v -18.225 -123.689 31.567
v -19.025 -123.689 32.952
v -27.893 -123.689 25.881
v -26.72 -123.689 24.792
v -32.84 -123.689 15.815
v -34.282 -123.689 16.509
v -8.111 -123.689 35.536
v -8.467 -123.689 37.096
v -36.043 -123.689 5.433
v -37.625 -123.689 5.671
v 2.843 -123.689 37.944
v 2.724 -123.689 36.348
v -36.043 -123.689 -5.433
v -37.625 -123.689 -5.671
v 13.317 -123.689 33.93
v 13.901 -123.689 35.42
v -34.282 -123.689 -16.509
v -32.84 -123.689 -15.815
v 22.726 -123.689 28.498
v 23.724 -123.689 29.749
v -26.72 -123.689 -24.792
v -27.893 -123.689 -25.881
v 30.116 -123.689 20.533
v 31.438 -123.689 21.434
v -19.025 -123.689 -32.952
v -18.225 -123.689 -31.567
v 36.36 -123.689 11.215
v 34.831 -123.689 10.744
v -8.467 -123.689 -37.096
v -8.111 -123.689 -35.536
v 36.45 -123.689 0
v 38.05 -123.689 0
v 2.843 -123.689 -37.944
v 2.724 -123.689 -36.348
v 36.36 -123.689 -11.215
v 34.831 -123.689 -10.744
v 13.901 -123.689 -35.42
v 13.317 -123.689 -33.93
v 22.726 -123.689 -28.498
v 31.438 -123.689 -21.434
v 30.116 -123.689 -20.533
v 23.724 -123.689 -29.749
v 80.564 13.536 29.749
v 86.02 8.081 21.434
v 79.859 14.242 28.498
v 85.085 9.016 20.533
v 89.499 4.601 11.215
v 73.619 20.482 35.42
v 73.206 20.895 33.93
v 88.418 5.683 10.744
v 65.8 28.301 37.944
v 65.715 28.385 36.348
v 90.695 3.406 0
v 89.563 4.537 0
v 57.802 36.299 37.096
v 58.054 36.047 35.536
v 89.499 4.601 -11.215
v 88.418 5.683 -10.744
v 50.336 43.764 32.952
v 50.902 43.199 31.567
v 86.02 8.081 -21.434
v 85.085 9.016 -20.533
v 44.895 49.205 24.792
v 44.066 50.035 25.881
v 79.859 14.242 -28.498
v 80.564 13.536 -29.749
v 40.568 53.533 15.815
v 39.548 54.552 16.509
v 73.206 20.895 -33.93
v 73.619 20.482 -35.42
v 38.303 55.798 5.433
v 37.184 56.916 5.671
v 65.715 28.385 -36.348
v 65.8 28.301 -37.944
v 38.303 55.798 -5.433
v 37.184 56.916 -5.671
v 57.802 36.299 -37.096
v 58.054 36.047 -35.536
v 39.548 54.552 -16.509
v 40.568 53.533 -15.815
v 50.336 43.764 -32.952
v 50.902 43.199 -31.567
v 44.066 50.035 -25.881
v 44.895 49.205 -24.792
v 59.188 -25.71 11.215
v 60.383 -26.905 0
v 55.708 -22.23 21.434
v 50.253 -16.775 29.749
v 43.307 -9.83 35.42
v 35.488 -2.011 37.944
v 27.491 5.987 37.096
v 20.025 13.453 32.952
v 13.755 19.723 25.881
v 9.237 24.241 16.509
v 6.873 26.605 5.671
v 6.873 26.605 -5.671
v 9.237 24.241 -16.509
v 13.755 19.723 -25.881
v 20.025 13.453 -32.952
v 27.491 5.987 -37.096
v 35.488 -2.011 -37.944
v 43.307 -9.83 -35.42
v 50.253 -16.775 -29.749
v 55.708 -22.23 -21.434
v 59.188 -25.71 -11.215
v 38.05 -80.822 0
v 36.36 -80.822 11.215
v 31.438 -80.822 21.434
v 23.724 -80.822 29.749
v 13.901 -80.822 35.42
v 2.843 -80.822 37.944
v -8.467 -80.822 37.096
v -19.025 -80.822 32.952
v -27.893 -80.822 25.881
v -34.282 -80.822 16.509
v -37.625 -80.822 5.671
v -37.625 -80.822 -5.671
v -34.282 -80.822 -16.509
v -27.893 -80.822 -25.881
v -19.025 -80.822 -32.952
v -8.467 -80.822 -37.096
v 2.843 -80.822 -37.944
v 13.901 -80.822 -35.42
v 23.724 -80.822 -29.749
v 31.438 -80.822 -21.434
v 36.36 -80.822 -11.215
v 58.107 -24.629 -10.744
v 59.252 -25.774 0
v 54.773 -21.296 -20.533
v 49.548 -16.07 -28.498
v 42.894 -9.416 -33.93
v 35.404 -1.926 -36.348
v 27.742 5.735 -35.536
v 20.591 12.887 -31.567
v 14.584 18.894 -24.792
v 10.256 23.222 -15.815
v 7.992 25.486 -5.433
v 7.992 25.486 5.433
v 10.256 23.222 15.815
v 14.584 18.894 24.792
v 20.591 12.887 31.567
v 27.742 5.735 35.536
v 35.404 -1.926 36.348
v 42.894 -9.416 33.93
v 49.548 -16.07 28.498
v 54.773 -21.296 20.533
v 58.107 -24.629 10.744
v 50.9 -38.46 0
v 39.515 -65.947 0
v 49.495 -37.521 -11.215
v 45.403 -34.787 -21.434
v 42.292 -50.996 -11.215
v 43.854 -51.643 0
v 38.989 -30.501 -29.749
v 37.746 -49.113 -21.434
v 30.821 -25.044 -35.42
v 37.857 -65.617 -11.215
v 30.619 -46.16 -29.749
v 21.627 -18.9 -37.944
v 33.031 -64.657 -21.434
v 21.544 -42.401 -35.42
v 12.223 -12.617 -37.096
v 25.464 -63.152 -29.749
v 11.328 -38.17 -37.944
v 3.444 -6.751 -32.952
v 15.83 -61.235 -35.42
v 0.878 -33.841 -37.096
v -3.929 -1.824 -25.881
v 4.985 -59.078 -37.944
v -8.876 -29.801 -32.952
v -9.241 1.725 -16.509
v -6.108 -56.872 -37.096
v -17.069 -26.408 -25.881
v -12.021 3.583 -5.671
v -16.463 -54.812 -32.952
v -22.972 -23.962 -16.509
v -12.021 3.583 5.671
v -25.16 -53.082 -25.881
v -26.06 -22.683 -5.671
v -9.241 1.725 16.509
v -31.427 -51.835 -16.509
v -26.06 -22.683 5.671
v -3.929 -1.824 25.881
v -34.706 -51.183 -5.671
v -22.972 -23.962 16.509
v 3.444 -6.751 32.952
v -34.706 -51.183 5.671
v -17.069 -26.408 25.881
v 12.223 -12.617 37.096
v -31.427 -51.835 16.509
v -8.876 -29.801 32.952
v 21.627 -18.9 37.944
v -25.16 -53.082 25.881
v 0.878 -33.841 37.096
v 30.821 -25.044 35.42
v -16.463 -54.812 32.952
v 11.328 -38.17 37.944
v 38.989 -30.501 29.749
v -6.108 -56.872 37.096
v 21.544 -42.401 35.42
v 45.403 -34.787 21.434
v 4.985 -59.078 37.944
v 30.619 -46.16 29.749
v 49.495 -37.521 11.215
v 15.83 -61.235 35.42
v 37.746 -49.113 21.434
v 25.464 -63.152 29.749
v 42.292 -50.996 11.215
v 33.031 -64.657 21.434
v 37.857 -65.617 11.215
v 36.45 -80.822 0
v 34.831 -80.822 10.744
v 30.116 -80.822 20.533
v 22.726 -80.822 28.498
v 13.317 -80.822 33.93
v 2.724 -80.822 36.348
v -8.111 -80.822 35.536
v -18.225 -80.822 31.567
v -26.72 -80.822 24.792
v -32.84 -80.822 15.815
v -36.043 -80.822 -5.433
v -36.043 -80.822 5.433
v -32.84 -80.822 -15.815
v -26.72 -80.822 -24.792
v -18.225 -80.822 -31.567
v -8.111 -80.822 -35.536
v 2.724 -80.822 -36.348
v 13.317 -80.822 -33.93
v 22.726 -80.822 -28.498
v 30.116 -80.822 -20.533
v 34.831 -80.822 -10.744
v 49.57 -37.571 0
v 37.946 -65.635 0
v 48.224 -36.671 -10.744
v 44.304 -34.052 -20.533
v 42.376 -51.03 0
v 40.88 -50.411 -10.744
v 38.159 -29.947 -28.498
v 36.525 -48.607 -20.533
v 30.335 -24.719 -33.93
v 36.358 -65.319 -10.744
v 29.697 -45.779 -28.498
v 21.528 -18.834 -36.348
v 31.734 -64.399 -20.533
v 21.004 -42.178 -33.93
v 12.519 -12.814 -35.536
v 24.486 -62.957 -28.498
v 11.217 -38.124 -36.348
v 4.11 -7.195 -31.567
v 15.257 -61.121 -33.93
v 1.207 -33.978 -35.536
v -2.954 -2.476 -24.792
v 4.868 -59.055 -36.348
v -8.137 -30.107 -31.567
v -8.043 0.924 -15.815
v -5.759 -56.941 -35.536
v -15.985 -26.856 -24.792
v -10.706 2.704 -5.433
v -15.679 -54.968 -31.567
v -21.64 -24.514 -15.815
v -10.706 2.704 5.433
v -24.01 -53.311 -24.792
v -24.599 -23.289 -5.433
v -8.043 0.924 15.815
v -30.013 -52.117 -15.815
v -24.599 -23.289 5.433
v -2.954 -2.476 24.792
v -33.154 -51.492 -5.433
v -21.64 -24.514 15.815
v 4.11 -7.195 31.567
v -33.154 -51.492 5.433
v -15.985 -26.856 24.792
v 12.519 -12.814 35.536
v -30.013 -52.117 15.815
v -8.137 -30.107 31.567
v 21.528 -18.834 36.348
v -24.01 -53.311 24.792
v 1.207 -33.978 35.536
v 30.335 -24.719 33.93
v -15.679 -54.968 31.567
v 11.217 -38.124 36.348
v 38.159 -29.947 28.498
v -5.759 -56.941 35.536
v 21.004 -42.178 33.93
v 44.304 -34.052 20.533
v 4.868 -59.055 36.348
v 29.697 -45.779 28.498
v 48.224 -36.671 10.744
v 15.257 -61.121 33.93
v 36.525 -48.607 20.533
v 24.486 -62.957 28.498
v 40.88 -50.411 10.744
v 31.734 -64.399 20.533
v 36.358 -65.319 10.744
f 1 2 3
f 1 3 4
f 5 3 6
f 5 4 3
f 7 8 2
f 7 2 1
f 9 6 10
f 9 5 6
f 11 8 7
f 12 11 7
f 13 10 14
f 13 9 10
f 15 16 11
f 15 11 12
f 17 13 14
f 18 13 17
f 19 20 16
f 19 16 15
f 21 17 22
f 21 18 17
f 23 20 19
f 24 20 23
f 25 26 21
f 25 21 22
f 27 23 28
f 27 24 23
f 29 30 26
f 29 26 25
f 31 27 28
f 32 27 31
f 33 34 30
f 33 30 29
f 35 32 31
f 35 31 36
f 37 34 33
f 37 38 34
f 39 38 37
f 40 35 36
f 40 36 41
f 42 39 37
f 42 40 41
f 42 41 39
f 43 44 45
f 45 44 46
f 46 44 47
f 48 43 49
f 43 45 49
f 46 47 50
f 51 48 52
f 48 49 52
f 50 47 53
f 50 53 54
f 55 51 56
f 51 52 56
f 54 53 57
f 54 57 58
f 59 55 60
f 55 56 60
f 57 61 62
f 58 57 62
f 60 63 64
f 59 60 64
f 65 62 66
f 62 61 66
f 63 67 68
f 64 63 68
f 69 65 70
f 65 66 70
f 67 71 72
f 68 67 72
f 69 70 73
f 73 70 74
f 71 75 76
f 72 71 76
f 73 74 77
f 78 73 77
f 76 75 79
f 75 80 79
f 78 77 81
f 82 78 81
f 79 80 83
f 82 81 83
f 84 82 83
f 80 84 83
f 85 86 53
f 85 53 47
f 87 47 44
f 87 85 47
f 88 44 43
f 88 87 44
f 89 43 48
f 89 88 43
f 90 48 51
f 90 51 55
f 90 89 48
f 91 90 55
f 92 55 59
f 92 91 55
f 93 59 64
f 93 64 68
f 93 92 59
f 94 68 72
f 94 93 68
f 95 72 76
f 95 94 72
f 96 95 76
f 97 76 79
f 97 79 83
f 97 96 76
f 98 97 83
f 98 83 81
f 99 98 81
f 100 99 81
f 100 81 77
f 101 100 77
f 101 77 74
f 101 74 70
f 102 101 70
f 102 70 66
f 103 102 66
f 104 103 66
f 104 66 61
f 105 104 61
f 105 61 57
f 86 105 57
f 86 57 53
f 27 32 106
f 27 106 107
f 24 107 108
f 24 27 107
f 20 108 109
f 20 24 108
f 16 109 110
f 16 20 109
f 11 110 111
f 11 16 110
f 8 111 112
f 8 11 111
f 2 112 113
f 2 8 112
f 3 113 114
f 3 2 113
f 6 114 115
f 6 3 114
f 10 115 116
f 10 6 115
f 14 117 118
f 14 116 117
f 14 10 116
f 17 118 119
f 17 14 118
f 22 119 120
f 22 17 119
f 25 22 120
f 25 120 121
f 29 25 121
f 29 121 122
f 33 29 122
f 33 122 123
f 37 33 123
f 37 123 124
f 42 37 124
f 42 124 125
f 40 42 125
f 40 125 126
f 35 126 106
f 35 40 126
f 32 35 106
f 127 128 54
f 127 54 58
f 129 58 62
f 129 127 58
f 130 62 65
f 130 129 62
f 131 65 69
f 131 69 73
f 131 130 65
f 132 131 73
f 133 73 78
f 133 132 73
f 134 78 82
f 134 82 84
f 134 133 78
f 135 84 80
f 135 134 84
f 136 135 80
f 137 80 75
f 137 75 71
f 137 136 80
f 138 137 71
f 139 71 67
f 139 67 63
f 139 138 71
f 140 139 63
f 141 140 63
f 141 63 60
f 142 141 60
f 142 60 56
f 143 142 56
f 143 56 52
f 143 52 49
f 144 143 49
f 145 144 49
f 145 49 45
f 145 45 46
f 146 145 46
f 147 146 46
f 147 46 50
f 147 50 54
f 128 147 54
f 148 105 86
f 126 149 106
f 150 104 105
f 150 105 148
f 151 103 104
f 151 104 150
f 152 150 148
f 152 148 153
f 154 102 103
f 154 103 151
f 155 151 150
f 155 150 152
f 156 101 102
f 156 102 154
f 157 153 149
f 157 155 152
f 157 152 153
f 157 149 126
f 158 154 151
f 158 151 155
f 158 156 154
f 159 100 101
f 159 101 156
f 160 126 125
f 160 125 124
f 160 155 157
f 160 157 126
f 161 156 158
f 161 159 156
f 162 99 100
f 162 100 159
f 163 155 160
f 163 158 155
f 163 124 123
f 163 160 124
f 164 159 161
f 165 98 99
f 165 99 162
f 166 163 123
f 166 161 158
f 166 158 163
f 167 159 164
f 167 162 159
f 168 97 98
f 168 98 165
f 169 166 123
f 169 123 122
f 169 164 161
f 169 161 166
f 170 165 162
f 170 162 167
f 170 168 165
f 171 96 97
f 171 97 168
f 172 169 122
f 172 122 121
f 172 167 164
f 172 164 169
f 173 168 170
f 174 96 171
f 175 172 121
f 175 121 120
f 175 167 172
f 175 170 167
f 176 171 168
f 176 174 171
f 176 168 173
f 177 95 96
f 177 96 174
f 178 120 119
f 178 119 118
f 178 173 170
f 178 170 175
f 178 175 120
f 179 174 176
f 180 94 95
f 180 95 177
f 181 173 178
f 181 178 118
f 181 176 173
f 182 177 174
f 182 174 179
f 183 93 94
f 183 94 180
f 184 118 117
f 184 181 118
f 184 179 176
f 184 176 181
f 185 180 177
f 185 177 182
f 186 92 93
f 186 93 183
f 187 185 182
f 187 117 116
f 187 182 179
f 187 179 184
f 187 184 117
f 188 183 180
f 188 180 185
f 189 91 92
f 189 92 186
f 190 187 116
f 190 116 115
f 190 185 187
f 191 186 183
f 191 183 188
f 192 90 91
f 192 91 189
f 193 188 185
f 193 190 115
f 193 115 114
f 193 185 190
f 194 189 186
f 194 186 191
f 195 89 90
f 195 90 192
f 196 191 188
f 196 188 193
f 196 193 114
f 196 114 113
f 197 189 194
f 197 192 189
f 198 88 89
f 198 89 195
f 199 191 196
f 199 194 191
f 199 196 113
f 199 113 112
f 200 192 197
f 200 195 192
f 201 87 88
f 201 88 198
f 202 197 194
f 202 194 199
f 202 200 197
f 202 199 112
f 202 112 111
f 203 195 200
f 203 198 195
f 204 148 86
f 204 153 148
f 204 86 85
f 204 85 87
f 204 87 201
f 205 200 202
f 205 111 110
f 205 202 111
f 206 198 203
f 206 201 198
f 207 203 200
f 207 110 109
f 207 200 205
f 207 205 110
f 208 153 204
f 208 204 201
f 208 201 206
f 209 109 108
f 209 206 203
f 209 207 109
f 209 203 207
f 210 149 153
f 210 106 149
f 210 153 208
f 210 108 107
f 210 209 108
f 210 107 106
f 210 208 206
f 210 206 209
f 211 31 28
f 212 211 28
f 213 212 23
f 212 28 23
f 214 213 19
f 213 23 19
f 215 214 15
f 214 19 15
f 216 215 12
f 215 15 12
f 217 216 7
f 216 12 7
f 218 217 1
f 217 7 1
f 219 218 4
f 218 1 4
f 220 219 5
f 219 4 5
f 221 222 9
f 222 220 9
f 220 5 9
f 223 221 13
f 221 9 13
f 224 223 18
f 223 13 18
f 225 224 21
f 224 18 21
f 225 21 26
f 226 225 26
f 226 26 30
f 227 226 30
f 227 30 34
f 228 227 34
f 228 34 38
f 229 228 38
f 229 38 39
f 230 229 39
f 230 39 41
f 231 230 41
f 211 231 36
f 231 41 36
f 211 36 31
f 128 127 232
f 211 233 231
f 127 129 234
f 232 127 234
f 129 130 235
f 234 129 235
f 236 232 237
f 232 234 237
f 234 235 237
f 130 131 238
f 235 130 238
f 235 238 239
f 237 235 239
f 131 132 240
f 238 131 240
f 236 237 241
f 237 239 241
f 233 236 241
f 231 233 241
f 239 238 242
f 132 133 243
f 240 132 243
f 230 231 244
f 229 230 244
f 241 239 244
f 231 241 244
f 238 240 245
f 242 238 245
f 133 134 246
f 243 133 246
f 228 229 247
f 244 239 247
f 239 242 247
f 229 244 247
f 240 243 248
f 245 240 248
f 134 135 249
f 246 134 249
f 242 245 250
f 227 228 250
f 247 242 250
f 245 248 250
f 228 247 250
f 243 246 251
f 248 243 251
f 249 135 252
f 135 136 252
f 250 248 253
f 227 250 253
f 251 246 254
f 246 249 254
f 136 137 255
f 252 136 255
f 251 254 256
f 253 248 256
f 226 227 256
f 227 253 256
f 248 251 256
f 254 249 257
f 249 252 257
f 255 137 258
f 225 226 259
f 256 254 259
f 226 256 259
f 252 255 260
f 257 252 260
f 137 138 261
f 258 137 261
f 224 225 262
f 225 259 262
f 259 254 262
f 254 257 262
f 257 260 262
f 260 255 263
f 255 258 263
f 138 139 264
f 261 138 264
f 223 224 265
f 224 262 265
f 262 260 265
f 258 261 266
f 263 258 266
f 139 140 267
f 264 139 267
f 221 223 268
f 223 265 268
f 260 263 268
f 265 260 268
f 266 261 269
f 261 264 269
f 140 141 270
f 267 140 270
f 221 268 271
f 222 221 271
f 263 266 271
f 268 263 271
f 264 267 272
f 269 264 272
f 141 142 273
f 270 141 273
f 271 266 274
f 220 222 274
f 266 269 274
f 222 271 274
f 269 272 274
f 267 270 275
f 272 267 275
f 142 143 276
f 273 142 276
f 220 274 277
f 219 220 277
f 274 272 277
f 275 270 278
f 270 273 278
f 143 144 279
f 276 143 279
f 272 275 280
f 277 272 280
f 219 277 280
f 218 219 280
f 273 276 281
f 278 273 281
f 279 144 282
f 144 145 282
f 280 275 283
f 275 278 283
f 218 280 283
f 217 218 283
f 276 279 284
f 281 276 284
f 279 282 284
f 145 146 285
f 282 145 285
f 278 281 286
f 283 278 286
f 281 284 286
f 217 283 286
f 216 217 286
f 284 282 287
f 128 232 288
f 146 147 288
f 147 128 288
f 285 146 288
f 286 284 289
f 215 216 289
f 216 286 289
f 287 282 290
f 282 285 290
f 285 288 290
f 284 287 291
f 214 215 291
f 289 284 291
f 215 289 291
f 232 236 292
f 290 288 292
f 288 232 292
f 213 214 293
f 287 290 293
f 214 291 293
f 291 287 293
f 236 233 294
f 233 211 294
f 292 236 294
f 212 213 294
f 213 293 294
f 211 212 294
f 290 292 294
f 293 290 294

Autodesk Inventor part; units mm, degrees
ref_plane "YZ Plane" through (0, 0, 0) normal (1, 0, 0) x (0, 1, 0)
ref_plane "XZ Plane" through (0, 0, 0) normal (0, 1, 0) x (-1, 0, 0)
sketch "Szkic6" plane through (0, 0, 0) normal (0, 0, 1) x (1, 0, 0)
  line L0 (-29.6067, 0) -> (35.2678, 0) construction
  line L1 (0, 42.3419) -> (0, -58.3726) construction
  arc A0 (33.4777, 0) -> (0, -80.8223) centre (114.3, -80.8223) ccw
  line L2 (0, -80.8223) -> (114.3, -80.8223) construction
  line L3 (114.3, -80.8223) -> (67.9611, -34.4834) construction
  line L4 (33.4777, 0) -> (63.7892, 30.3115)
  line L5 (0, -80.8223) -> (0, -123.6893)
  point P0 (0, 0)
  dimension "d24" = 114.3
  dimension "d31" = 45
  dimension "d36" = 42.867
  dimension "d37" = 42.867
ref_plane "Płaszczyzna konstrukcyjna2" through (0, -80.8223, 0) normal (0, -1, 0) x (1, 0, 0)
sketch "Szkic8" plane through (0, -80.8223, 0) normal (0, -1, 0) x (1, 0, 0)
  circle A0 centre (0, 0) radius 38.05
  circle A1 centre (0, 0) radius 36.45
  dimension "d32" = 76.1
  dimension "d33" = 1.6
sweep "Przeciągnięcie2" add profiles "Szkic8" path "Szkic6"
equation "\"d32\" = OD"
equation "\"d33\" = THK"
equation "\"d24\" = R"
equation "\"d31\" = KAT"
equation "\"d36\" = PROSTKA"
equation "\"d37\" = PROSTKA"
equation "\"SzerokośćGięciaPodcięcia\" = Grubość"
equation "\"RozmiarPodcięciaNarożnika\" = 4 * Grubość"
equation "\"PromieńPrzejścia\" = PromieńGięcia"
equation "\"Rozmiar_promienia_Jacobiego\" = PromieńGięcia"
equation "\"Wielk_odstępu\" = Grubość"
equation "\"d2\" = PromieńGięcia"
equation "\"d23\" = PromieńGięcia"
equation "\"R\" = 114.3"
equation "\"OD\" = 76.1"
equation "\"THK\" = 1.6"
equation "\"KAT\" = 45deg"
equation "\"PROSTKA\" = 42.867"
equation "\"Grubość\" = 1.5"
equation "\"PromieńGięcia\" = 3"
properties part number "Kolano 45° ø76,1x1,6 R114,3" material "304L"
